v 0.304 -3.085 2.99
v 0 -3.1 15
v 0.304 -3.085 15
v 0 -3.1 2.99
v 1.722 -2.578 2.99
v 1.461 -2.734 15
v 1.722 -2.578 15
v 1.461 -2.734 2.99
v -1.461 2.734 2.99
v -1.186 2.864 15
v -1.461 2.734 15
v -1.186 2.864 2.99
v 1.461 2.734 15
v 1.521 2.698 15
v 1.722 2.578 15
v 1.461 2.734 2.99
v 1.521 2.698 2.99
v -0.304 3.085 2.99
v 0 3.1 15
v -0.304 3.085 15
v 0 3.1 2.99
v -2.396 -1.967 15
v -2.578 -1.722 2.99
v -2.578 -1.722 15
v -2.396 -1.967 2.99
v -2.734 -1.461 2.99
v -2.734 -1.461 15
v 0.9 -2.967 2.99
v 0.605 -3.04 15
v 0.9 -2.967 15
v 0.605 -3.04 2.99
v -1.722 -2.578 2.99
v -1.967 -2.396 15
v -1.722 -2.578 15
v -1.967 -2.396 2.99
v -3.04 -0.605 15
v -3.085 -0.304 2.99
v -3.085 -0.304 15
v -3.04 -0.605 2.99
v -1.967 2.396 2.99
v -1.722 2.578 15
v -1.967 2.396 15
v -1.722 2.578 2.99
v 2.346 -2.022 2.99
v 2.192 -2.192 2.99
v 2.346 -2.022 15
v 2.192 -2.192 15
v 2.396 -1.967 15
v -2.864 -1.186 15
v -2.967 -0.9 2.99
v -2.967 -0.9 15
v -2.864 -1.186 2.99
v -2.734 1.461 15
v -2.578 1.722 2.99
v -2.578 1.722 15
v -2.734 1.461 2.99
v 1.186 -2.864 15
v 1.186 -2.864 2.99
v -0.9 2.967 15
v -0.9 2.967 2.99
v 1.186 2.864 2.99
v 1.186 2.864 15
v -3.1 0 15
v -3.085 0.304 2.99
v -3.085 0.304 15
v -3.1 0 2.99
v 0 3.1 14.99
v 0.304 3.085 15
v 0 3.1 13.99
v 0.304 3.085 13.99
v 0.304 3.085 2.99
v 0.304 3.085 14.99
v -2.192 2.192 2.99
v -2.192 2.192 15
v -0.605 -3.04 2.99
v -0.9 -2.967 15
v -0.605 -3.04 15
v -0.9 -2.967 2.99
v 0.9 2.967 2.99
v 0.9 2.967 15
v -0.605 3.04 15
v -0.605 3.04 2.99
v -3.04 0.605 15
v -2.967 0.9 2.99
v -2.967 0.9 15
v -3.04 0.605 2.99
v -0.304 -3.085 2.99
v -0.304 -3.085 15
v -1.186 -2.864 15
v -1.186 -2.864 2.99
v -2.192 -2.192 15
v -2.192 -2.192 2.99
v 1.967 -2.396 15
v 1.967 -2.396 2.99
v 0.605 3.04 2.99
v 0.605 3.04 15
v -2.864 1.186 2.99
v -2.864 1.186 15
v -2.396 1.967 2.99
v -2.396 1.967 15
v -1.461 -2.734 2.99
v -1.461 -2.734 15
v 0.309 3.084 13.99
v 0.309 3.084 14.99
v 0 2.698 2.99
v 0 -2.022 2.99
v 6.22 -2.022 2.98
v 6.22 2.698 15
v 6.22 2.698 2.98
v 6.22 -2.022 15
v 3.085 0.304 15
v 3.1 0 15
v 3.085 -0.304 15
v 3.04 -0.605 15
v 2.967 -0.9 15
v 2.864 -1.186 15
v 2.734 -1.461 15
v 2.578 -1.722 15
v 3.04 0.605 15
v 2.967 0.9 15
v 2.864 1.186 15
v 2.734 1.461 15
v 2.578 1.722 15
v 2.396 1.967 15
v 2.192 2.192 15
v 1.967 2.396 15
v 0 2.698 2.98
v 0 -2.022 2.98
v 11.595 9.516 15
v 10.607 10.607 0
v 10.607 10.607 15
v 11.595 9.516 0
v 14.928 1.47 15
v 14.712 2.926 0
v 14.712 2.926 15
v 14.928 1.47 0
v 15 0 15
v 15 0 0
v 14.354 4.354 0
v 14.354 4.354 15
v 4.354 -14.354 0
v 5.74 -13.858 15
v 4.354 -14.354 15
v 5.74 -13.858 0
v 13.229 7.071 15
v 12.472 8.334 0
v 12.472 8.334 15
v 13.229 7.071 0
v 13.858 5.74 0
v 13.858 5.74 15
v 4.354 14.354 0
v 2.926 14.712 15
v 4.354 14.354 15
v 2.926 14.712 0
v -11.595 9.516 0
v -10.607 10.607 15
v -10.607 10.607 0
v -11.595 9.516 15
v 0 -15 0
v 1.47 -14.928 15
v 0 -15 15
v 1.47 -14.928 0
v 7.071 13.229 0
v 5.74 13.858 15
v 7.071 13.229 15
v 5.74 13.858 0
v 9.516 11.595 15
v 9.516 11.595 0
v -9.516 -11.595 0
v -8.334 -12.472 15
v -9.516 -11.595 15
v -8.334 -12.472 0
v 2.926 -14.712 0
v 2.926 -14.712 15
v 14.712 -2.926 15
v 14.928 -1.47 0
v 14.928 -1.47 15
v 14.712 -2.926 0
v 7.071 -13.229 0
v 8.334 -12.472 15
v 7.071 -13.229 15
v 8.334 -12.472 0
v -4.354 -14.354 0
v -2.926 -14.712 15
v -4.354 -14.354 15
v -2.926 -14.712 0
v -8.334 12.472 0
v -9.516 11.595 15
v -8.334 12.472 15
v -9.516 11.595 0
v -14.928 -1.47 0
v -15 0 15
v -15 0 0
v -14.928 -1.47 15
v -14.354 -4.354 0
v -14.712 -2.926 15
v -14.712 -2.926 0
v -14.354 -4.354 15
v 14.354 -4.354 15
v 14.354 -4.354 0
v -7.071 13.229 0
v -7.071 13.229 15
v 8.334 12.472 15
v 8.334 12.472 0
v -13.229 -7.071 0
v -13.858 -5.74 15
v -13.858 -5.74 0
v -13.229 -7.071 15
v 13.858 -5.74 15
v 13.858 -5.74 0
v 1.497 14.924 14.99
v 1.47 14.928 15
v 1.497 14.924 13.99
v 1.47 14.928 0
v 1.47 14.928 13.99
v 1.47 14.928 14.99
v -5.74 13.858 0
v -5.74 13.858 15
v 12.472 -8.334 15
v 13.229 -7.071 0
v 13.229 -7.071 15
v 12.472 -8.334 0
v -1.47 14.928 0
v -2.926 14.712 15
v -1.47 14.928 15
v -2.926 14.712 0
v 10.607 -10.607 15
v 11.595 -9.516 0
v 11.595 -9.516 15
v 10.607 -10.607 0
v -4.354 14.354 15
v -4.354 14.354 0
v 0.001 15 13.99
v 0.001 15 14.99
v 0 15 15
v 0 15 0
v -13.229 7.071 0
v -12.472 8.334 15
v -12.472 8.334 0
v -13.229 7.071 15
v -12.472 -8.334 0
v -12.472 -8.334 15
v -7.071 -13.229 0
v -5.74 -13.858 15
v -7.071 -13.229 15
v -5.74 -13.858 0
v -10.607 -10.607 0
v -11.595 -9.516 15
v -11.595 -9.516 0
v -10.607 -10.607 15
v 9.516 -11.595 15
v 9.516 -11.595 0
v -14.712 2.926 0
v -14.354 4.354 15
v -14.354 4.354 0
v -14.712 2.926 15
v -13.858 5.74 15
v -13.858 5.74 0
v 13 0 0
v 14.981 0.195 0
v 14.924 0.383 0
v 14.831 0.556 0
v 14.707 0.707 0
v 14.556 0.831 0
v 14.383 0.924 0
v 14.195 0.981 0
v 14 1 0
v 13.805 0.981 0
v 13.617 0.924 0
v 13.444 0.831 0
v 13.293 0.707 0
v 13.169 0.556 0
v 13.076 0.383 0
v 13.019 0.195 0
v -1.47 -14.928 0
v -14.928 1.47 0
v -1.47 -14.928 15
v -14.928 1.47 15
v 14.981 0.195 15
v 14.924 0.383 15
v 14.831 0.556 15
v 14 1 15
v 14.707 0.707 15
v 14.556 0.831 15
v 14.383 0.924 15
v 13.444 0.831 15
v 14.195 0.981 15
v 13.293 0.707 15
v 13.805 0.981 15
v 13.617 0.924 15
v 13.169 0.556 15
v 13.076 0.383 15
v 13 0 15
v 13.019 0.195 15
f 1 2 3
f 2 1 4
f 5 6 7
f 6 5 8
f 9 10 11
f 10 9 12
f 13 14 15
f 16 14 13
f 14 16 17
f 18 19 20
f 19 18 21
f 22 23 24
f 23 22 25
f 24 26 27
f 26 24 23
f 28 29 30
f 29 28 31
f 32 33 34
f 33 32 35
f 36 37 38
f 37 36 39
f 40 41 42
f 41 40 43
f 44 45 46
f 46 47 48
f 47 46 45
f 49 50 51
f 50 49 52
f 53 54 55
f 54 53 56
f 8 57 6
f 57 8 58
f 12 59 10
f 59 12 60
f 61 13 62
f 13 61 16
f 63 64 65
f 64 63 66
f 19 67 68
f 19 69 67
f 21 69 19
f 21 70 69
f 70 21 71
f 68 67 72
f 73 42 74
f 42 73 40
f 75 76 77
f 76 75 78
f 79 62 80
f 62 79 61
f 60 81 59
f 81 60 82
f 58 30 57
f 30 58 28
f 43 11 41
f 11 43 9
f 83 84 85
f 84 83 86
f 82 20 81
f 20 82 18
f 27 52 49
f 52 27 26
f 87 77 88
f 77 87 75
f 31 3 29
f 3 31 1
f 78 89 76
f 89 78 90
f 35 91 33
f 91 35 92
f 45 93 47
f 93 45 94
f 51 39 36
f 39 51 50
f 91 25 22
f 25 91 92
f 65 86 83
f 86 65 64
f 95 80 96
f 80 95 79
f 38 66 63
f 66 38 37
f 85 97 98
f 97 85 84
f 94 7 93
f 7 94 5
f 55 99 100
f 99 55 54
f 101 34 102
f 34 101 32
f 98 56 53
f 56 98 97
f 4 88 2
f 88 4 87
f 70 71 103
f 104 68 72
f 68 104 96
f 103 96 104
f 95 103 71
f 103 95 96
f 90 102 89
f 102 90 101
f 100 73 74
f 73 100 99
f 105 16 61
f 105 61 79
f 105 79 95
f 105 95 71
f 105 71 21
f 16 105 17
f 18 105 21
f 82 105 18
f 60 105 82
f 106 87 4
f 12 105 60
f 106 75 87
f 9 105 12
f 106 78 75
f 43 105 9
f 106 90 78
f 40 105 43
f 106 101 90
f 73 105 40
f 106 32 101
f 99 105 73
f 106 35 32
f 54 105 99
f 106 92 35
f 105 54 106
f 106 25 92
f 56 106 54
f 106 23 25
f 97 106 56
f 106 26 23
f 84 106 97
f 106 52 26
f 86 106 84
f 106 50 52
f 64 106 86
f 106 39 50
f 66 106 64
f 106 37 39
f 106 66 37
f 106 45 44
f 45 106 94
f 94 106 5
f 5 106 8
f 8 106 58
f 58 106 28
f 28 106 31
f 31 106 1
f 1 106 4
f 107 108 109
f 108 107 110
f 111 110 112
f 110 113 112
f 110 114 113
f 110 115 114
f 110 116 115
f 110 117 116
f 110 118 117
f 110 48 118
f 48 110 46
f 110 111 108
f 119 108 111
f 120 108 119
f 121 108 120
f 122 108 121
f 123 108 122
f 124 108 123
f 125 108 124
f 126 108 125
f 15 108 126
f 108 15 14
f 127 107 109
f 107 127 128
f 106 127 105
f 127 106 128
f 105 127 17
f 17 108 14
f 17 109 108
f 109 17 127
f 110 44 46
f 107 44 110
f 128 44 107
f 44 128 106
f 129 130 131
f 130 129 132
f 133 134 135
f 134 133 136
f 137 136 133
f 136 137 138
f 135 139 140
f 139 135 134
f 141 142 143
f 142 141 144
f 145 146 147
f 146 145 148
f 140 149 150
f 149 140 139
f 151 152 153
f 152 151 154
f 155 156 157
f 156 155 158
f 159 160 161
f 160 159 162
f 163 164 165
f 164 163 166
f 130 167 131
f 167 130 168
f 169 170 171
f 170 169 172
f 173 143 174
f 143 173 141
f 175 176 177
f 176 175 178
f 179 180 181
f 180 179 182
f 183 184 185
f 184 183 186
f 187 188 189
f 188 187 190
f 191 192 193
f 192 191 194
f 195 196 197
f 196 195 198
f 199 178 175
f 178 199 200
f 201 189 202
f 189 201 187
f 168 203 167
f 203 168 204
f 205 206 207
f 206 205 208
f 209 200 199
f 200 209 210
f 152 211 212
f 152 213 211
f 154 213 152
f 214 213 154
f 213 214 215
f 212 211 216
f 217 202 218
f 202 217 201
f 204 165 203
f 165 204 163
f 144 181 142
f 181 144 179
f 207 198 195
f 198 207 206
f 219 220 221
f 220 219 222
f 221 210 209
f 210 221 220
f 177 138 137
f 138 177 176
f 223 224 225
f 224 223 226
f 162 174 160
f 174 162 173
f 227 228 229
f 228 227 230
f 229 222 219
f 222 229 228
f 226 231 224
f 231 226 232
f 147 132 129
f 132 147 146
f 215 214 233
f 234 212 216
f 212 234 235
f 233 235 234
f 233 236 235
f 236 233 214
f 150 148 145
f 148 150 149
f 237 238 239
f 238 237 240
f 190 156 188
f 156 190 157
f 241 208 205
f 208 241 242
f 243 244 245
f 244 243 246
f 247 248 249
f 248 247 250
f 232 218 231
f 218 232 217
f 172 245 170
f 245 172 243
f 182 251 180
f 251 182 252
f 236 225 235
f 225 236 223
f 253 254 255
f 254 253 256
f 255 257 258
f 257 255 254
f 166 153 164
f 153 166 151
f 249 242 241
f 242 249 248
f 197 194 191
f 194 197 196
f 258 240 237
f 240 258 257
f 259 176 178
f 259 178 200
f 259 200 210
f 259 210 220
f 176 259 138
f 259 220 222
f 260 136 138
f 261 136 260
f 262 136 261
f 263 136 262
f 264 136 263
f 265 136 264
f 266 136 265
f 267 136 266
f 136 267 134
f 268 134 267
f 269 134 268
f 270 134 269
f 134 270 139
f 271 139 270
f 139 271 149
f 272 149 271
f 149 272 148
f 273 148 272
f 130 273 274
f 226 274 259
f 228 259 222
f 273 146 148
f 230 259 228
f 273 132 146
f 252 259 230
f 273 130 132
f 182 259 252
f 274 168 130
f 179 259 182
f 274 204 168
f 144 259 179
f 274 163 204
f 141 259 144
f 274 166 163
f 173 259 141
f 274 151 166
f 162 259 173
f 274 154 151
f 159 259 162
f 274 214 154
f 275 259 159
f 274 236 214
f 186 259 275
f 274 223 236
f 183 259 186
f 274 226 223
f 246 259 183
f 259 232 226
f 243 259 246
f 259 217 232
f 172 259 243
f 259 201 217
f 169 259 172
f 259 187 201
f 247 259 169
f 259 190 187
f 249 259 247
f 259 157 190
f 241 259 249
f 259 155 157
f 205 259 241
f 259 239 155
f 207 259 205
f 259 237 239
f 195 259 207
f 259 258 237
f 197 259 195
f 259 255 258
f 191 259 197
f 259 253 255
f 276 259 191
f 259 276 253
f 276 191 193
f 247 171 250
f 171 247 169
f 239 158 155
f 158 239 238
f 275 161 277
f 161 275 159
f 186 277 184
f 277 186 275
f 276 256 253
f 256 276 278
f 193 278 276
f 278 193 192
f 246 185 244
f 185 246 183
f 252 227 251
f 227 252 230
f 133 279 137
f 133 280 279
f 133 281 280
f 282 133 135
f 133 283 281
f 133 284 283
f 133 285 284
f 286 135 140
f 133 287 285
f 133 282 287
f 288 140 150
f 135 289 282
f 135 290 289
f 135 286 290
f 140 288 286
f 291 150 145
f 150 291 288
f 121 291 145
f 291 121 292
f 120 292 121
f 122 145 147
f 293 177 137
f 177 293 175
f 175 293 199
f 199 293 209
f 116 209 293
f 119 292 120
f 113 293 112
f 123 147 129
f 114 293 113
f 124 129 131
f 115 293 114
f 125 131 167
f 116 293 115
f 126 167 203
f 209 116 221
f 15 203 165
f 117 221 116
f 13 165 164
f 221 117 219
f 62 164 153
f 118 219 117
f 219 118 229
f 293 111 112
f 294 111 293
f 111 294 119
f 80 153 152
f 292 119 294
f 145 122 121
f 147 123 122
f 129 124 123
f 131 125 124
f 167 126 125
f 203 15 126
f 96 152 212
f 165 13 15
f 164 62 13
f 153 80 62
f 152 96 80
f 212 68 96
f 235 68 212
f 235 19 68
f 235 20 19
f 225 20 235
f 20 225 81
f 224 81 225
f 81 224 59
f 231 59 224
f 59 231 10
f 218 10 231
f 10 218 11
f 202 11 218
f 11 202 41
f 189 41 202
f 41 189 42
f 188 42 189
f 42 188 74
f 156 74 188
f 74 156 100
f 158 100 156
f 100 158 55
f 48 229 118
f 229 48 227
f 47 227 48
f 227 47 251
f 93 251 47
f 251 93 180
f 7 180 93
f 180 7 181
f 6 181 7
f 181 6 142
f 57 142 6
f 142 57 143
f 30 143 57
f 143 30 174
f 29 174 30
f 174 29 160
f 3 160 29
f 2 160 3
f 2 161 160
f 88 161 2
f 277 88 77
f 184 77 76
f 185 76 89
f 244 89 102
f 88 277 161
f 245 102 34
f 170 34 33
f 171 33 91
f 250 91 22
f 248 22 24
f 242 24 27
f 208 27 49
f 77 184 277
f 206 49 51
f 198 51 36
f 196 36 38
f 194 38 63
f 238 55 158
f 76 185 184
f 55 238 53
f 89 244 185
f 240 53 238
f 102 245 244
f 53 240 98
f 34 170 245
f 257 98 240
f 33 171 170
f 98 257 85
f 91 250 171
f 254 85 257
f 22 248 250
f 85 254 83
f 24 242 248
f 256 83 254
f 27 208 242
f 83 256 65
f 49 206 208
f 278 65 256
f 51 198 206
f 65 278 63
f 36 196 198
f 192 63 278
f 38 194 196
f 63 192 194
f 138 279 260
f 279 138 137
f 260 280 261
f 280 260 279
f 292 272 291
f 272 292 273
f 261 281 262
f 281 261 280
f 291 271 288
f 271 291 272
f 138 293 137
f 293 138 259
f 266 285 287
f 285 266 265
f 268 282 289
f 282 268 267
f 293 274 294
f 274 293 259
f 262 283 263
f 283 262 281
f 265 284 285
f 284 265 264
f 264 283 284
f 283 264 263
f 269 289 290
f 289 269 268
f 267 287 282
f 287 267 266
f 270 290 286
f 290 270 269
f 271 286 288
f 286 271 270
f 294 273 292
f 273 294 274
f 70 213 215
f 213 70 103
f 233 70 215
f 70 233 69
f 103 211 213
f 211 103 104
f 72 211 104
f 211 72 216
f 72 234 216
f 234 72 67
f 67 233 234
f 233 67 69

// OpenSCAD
// Replacement knob for hotplate stirrer with 6 mm D-shaft
// Dimensions
d_shaft = 6.0;           // shaft diameter (mm)
d_knob = 30.0;           // knob outer diameter (mm)
h_knob = 15.0;           // knob total height (mm)
h_bore = 12.0;           // depth of D-bore (mm)
d_bore = 6.2;            // bore circle diameter (mm)
flat_to_flat = 4.7;      // distance from flat side to opposite side of D-bore (mm)
groove_d = 2.0;          // groove diameter (half-cylinder) (mm)
n_grooves = 18;          // number of grip grooves
pointer_width = 1.5;     // pointer groove width (mm)
pointer_depth = 1.0;     // pointer groove depth (mm)

// Geometry calculations
r_knob = d_knob / 2;
r_bore = d_bore / 2;
// Distance from center to flat side of D-bore
h_flat = sqrt(r_bore^2 - (flat_to_flat/2)^2);
// Height of D-bore flat from center (negative because flat is at bottom)
y_flat = -h_flat;

// Set resolution for curves
$fn = 64;

module knob() {
    // Main cylinder
    cylinder(h = h_knob, r = r_knob, center = false);
}

module d_bore() {
    // D-shaped blind bore: cylinder with flat cut on one side
    translate([0, 0, -0.01]) {
        // Full cylinder
        cylinder(h = h_bore + 0.02, r = r_bore, center = false);
        
        // Cut flat side: extrude a rectangle to remove material
        // The flat is at y = -h_flat, and extends across the diameter
        translate([0, y_flat, -0.01]) {
            cube([d_bore + 0.02, flat_to_flat + 0.02, h_bore + 0.02]);
        }
    }
}

module grip_grooves() {
    r_groove = groove_d / 2;
    // Create semicircular groove profile (outer half-cylinder)
    // The groove is centered at r = r_knob - r_groove, and extends radially outward
    // We'll use rotate_extrude with a semicircle pointing outward
    
    // Define the semicircle profile in the r-z plane (r as x-axis, z as y-axis)
    // The semicircle has radius r_groove, centered at (r_knob - r_groove, 0)
    // We want the outer half (pointing away from center), so we'll use angles -90 to 90 degrees
    
    // Create the semicircular groove profile
    translate([r_knob - r_groove, 0, -0.01]) {
        rotate_extrude(angle = 180, $fn = 32) {
            // Semicircle pointing outward: from y = 0 to y = r_groove (top half in local coordinates)
            // But we need to flip it so it points outward
            // Use a polygon that represents a semicircle pointing in +r direction
            polygon(points = [
                [0, 0],
                [r_groove, 0],
                [r_groove, h_knob + 0.02],
                [0, h_knob + 0.02]
            ]);
        }
    }
}

module pointer_groove() {
    // Pointer groove: from center to outer edge, 1.5mm wide, 1mm deep
    // On the same side as the flat of the D (positive y side)
    // Width is along the circumference, so we need a wedge-shaped groove
    
    // Calculate the angle for the pointer groove
    // The groove is 1.5mm wide at the outer edge (radius = r_knob)
    // Angle = width / radius (in radians)
    pointer_angle = (pointer_width / r_knob) * (180 / PI);
    
    // But since the groove is radial, we'll use a different approach
    // Create a triangular wedge from center to edge
    // The groove is 1.5mm wide at the outer edge, so we need to calculate the angle
    
    // Actually, simpler: use a rotated wedge
    // The groove is centered on the positive y-axis (same side as D-flat)
    // So we'll rotate it to align with the D-flat side
    
    // Define the groove as a wedge
    rotate([0, 0, -pointer_angle/2]) {
        linear_extrude(height = pointer_depth, center = false, convexity = 10) {
            // Triangle from center to outer edge
            polygon(points = [
                [0, 0],
                [r_knob, -pointer_width/2],
                [r_knob, pointer_width/2]
            ]);
        }
    }
}

module knob_with_features() {
    difference() {
        knob();
        
        // D-shaped bore
        translate([0, 0, h_knob - h_bore]) {
            d_bore();
        }
        
        // Grip grooves
        // Use rotate_extrude approach for grip grooves
        // Create the semicircular groove profile and rotate it
        r_groove = groove_d / 2;
        
        // Create the groove profile as a semicircle pointing outward
        // We'll do this by creating a full cylinder and subtracting the inner half
        // But rotate_extrude is cleaner
        
        // Define the semicircle profile in the r-z plane
        // The profile is a semicircle of radius r_groove, centered at (r_knob - r_groove, 0)
        // We want the outer half, so we'll use angles -90 to 90 degrees
        
        // Create the semicircular groove
        translate([r_knob - r_groove, 0, -0.01]) {
            rotate_extrude(angle = 180, $fn = 32) {
                // Semicircle pointing outward: use a rectangle that will be rotated to make a hollow cylinder
                // But we need a semicircle, so use a polygon
                polygon(points = [
                    [0, 0],
                    [r_groove, 0],
                    [r_groove, h_knob + 0.02],
                    [0, h_knob + 0.02]
                ]);
            }
        }
        
        // Pointer groove
        translate([0, 0, h_knob - pointer_depth - 0.01]) {
            rotate([0, 0, 90]) {  // Align with D-flat side (positive y-axis)
                pointer_groove();
            }
        }
    }
}

// Build the final knob
knob_with_features();
